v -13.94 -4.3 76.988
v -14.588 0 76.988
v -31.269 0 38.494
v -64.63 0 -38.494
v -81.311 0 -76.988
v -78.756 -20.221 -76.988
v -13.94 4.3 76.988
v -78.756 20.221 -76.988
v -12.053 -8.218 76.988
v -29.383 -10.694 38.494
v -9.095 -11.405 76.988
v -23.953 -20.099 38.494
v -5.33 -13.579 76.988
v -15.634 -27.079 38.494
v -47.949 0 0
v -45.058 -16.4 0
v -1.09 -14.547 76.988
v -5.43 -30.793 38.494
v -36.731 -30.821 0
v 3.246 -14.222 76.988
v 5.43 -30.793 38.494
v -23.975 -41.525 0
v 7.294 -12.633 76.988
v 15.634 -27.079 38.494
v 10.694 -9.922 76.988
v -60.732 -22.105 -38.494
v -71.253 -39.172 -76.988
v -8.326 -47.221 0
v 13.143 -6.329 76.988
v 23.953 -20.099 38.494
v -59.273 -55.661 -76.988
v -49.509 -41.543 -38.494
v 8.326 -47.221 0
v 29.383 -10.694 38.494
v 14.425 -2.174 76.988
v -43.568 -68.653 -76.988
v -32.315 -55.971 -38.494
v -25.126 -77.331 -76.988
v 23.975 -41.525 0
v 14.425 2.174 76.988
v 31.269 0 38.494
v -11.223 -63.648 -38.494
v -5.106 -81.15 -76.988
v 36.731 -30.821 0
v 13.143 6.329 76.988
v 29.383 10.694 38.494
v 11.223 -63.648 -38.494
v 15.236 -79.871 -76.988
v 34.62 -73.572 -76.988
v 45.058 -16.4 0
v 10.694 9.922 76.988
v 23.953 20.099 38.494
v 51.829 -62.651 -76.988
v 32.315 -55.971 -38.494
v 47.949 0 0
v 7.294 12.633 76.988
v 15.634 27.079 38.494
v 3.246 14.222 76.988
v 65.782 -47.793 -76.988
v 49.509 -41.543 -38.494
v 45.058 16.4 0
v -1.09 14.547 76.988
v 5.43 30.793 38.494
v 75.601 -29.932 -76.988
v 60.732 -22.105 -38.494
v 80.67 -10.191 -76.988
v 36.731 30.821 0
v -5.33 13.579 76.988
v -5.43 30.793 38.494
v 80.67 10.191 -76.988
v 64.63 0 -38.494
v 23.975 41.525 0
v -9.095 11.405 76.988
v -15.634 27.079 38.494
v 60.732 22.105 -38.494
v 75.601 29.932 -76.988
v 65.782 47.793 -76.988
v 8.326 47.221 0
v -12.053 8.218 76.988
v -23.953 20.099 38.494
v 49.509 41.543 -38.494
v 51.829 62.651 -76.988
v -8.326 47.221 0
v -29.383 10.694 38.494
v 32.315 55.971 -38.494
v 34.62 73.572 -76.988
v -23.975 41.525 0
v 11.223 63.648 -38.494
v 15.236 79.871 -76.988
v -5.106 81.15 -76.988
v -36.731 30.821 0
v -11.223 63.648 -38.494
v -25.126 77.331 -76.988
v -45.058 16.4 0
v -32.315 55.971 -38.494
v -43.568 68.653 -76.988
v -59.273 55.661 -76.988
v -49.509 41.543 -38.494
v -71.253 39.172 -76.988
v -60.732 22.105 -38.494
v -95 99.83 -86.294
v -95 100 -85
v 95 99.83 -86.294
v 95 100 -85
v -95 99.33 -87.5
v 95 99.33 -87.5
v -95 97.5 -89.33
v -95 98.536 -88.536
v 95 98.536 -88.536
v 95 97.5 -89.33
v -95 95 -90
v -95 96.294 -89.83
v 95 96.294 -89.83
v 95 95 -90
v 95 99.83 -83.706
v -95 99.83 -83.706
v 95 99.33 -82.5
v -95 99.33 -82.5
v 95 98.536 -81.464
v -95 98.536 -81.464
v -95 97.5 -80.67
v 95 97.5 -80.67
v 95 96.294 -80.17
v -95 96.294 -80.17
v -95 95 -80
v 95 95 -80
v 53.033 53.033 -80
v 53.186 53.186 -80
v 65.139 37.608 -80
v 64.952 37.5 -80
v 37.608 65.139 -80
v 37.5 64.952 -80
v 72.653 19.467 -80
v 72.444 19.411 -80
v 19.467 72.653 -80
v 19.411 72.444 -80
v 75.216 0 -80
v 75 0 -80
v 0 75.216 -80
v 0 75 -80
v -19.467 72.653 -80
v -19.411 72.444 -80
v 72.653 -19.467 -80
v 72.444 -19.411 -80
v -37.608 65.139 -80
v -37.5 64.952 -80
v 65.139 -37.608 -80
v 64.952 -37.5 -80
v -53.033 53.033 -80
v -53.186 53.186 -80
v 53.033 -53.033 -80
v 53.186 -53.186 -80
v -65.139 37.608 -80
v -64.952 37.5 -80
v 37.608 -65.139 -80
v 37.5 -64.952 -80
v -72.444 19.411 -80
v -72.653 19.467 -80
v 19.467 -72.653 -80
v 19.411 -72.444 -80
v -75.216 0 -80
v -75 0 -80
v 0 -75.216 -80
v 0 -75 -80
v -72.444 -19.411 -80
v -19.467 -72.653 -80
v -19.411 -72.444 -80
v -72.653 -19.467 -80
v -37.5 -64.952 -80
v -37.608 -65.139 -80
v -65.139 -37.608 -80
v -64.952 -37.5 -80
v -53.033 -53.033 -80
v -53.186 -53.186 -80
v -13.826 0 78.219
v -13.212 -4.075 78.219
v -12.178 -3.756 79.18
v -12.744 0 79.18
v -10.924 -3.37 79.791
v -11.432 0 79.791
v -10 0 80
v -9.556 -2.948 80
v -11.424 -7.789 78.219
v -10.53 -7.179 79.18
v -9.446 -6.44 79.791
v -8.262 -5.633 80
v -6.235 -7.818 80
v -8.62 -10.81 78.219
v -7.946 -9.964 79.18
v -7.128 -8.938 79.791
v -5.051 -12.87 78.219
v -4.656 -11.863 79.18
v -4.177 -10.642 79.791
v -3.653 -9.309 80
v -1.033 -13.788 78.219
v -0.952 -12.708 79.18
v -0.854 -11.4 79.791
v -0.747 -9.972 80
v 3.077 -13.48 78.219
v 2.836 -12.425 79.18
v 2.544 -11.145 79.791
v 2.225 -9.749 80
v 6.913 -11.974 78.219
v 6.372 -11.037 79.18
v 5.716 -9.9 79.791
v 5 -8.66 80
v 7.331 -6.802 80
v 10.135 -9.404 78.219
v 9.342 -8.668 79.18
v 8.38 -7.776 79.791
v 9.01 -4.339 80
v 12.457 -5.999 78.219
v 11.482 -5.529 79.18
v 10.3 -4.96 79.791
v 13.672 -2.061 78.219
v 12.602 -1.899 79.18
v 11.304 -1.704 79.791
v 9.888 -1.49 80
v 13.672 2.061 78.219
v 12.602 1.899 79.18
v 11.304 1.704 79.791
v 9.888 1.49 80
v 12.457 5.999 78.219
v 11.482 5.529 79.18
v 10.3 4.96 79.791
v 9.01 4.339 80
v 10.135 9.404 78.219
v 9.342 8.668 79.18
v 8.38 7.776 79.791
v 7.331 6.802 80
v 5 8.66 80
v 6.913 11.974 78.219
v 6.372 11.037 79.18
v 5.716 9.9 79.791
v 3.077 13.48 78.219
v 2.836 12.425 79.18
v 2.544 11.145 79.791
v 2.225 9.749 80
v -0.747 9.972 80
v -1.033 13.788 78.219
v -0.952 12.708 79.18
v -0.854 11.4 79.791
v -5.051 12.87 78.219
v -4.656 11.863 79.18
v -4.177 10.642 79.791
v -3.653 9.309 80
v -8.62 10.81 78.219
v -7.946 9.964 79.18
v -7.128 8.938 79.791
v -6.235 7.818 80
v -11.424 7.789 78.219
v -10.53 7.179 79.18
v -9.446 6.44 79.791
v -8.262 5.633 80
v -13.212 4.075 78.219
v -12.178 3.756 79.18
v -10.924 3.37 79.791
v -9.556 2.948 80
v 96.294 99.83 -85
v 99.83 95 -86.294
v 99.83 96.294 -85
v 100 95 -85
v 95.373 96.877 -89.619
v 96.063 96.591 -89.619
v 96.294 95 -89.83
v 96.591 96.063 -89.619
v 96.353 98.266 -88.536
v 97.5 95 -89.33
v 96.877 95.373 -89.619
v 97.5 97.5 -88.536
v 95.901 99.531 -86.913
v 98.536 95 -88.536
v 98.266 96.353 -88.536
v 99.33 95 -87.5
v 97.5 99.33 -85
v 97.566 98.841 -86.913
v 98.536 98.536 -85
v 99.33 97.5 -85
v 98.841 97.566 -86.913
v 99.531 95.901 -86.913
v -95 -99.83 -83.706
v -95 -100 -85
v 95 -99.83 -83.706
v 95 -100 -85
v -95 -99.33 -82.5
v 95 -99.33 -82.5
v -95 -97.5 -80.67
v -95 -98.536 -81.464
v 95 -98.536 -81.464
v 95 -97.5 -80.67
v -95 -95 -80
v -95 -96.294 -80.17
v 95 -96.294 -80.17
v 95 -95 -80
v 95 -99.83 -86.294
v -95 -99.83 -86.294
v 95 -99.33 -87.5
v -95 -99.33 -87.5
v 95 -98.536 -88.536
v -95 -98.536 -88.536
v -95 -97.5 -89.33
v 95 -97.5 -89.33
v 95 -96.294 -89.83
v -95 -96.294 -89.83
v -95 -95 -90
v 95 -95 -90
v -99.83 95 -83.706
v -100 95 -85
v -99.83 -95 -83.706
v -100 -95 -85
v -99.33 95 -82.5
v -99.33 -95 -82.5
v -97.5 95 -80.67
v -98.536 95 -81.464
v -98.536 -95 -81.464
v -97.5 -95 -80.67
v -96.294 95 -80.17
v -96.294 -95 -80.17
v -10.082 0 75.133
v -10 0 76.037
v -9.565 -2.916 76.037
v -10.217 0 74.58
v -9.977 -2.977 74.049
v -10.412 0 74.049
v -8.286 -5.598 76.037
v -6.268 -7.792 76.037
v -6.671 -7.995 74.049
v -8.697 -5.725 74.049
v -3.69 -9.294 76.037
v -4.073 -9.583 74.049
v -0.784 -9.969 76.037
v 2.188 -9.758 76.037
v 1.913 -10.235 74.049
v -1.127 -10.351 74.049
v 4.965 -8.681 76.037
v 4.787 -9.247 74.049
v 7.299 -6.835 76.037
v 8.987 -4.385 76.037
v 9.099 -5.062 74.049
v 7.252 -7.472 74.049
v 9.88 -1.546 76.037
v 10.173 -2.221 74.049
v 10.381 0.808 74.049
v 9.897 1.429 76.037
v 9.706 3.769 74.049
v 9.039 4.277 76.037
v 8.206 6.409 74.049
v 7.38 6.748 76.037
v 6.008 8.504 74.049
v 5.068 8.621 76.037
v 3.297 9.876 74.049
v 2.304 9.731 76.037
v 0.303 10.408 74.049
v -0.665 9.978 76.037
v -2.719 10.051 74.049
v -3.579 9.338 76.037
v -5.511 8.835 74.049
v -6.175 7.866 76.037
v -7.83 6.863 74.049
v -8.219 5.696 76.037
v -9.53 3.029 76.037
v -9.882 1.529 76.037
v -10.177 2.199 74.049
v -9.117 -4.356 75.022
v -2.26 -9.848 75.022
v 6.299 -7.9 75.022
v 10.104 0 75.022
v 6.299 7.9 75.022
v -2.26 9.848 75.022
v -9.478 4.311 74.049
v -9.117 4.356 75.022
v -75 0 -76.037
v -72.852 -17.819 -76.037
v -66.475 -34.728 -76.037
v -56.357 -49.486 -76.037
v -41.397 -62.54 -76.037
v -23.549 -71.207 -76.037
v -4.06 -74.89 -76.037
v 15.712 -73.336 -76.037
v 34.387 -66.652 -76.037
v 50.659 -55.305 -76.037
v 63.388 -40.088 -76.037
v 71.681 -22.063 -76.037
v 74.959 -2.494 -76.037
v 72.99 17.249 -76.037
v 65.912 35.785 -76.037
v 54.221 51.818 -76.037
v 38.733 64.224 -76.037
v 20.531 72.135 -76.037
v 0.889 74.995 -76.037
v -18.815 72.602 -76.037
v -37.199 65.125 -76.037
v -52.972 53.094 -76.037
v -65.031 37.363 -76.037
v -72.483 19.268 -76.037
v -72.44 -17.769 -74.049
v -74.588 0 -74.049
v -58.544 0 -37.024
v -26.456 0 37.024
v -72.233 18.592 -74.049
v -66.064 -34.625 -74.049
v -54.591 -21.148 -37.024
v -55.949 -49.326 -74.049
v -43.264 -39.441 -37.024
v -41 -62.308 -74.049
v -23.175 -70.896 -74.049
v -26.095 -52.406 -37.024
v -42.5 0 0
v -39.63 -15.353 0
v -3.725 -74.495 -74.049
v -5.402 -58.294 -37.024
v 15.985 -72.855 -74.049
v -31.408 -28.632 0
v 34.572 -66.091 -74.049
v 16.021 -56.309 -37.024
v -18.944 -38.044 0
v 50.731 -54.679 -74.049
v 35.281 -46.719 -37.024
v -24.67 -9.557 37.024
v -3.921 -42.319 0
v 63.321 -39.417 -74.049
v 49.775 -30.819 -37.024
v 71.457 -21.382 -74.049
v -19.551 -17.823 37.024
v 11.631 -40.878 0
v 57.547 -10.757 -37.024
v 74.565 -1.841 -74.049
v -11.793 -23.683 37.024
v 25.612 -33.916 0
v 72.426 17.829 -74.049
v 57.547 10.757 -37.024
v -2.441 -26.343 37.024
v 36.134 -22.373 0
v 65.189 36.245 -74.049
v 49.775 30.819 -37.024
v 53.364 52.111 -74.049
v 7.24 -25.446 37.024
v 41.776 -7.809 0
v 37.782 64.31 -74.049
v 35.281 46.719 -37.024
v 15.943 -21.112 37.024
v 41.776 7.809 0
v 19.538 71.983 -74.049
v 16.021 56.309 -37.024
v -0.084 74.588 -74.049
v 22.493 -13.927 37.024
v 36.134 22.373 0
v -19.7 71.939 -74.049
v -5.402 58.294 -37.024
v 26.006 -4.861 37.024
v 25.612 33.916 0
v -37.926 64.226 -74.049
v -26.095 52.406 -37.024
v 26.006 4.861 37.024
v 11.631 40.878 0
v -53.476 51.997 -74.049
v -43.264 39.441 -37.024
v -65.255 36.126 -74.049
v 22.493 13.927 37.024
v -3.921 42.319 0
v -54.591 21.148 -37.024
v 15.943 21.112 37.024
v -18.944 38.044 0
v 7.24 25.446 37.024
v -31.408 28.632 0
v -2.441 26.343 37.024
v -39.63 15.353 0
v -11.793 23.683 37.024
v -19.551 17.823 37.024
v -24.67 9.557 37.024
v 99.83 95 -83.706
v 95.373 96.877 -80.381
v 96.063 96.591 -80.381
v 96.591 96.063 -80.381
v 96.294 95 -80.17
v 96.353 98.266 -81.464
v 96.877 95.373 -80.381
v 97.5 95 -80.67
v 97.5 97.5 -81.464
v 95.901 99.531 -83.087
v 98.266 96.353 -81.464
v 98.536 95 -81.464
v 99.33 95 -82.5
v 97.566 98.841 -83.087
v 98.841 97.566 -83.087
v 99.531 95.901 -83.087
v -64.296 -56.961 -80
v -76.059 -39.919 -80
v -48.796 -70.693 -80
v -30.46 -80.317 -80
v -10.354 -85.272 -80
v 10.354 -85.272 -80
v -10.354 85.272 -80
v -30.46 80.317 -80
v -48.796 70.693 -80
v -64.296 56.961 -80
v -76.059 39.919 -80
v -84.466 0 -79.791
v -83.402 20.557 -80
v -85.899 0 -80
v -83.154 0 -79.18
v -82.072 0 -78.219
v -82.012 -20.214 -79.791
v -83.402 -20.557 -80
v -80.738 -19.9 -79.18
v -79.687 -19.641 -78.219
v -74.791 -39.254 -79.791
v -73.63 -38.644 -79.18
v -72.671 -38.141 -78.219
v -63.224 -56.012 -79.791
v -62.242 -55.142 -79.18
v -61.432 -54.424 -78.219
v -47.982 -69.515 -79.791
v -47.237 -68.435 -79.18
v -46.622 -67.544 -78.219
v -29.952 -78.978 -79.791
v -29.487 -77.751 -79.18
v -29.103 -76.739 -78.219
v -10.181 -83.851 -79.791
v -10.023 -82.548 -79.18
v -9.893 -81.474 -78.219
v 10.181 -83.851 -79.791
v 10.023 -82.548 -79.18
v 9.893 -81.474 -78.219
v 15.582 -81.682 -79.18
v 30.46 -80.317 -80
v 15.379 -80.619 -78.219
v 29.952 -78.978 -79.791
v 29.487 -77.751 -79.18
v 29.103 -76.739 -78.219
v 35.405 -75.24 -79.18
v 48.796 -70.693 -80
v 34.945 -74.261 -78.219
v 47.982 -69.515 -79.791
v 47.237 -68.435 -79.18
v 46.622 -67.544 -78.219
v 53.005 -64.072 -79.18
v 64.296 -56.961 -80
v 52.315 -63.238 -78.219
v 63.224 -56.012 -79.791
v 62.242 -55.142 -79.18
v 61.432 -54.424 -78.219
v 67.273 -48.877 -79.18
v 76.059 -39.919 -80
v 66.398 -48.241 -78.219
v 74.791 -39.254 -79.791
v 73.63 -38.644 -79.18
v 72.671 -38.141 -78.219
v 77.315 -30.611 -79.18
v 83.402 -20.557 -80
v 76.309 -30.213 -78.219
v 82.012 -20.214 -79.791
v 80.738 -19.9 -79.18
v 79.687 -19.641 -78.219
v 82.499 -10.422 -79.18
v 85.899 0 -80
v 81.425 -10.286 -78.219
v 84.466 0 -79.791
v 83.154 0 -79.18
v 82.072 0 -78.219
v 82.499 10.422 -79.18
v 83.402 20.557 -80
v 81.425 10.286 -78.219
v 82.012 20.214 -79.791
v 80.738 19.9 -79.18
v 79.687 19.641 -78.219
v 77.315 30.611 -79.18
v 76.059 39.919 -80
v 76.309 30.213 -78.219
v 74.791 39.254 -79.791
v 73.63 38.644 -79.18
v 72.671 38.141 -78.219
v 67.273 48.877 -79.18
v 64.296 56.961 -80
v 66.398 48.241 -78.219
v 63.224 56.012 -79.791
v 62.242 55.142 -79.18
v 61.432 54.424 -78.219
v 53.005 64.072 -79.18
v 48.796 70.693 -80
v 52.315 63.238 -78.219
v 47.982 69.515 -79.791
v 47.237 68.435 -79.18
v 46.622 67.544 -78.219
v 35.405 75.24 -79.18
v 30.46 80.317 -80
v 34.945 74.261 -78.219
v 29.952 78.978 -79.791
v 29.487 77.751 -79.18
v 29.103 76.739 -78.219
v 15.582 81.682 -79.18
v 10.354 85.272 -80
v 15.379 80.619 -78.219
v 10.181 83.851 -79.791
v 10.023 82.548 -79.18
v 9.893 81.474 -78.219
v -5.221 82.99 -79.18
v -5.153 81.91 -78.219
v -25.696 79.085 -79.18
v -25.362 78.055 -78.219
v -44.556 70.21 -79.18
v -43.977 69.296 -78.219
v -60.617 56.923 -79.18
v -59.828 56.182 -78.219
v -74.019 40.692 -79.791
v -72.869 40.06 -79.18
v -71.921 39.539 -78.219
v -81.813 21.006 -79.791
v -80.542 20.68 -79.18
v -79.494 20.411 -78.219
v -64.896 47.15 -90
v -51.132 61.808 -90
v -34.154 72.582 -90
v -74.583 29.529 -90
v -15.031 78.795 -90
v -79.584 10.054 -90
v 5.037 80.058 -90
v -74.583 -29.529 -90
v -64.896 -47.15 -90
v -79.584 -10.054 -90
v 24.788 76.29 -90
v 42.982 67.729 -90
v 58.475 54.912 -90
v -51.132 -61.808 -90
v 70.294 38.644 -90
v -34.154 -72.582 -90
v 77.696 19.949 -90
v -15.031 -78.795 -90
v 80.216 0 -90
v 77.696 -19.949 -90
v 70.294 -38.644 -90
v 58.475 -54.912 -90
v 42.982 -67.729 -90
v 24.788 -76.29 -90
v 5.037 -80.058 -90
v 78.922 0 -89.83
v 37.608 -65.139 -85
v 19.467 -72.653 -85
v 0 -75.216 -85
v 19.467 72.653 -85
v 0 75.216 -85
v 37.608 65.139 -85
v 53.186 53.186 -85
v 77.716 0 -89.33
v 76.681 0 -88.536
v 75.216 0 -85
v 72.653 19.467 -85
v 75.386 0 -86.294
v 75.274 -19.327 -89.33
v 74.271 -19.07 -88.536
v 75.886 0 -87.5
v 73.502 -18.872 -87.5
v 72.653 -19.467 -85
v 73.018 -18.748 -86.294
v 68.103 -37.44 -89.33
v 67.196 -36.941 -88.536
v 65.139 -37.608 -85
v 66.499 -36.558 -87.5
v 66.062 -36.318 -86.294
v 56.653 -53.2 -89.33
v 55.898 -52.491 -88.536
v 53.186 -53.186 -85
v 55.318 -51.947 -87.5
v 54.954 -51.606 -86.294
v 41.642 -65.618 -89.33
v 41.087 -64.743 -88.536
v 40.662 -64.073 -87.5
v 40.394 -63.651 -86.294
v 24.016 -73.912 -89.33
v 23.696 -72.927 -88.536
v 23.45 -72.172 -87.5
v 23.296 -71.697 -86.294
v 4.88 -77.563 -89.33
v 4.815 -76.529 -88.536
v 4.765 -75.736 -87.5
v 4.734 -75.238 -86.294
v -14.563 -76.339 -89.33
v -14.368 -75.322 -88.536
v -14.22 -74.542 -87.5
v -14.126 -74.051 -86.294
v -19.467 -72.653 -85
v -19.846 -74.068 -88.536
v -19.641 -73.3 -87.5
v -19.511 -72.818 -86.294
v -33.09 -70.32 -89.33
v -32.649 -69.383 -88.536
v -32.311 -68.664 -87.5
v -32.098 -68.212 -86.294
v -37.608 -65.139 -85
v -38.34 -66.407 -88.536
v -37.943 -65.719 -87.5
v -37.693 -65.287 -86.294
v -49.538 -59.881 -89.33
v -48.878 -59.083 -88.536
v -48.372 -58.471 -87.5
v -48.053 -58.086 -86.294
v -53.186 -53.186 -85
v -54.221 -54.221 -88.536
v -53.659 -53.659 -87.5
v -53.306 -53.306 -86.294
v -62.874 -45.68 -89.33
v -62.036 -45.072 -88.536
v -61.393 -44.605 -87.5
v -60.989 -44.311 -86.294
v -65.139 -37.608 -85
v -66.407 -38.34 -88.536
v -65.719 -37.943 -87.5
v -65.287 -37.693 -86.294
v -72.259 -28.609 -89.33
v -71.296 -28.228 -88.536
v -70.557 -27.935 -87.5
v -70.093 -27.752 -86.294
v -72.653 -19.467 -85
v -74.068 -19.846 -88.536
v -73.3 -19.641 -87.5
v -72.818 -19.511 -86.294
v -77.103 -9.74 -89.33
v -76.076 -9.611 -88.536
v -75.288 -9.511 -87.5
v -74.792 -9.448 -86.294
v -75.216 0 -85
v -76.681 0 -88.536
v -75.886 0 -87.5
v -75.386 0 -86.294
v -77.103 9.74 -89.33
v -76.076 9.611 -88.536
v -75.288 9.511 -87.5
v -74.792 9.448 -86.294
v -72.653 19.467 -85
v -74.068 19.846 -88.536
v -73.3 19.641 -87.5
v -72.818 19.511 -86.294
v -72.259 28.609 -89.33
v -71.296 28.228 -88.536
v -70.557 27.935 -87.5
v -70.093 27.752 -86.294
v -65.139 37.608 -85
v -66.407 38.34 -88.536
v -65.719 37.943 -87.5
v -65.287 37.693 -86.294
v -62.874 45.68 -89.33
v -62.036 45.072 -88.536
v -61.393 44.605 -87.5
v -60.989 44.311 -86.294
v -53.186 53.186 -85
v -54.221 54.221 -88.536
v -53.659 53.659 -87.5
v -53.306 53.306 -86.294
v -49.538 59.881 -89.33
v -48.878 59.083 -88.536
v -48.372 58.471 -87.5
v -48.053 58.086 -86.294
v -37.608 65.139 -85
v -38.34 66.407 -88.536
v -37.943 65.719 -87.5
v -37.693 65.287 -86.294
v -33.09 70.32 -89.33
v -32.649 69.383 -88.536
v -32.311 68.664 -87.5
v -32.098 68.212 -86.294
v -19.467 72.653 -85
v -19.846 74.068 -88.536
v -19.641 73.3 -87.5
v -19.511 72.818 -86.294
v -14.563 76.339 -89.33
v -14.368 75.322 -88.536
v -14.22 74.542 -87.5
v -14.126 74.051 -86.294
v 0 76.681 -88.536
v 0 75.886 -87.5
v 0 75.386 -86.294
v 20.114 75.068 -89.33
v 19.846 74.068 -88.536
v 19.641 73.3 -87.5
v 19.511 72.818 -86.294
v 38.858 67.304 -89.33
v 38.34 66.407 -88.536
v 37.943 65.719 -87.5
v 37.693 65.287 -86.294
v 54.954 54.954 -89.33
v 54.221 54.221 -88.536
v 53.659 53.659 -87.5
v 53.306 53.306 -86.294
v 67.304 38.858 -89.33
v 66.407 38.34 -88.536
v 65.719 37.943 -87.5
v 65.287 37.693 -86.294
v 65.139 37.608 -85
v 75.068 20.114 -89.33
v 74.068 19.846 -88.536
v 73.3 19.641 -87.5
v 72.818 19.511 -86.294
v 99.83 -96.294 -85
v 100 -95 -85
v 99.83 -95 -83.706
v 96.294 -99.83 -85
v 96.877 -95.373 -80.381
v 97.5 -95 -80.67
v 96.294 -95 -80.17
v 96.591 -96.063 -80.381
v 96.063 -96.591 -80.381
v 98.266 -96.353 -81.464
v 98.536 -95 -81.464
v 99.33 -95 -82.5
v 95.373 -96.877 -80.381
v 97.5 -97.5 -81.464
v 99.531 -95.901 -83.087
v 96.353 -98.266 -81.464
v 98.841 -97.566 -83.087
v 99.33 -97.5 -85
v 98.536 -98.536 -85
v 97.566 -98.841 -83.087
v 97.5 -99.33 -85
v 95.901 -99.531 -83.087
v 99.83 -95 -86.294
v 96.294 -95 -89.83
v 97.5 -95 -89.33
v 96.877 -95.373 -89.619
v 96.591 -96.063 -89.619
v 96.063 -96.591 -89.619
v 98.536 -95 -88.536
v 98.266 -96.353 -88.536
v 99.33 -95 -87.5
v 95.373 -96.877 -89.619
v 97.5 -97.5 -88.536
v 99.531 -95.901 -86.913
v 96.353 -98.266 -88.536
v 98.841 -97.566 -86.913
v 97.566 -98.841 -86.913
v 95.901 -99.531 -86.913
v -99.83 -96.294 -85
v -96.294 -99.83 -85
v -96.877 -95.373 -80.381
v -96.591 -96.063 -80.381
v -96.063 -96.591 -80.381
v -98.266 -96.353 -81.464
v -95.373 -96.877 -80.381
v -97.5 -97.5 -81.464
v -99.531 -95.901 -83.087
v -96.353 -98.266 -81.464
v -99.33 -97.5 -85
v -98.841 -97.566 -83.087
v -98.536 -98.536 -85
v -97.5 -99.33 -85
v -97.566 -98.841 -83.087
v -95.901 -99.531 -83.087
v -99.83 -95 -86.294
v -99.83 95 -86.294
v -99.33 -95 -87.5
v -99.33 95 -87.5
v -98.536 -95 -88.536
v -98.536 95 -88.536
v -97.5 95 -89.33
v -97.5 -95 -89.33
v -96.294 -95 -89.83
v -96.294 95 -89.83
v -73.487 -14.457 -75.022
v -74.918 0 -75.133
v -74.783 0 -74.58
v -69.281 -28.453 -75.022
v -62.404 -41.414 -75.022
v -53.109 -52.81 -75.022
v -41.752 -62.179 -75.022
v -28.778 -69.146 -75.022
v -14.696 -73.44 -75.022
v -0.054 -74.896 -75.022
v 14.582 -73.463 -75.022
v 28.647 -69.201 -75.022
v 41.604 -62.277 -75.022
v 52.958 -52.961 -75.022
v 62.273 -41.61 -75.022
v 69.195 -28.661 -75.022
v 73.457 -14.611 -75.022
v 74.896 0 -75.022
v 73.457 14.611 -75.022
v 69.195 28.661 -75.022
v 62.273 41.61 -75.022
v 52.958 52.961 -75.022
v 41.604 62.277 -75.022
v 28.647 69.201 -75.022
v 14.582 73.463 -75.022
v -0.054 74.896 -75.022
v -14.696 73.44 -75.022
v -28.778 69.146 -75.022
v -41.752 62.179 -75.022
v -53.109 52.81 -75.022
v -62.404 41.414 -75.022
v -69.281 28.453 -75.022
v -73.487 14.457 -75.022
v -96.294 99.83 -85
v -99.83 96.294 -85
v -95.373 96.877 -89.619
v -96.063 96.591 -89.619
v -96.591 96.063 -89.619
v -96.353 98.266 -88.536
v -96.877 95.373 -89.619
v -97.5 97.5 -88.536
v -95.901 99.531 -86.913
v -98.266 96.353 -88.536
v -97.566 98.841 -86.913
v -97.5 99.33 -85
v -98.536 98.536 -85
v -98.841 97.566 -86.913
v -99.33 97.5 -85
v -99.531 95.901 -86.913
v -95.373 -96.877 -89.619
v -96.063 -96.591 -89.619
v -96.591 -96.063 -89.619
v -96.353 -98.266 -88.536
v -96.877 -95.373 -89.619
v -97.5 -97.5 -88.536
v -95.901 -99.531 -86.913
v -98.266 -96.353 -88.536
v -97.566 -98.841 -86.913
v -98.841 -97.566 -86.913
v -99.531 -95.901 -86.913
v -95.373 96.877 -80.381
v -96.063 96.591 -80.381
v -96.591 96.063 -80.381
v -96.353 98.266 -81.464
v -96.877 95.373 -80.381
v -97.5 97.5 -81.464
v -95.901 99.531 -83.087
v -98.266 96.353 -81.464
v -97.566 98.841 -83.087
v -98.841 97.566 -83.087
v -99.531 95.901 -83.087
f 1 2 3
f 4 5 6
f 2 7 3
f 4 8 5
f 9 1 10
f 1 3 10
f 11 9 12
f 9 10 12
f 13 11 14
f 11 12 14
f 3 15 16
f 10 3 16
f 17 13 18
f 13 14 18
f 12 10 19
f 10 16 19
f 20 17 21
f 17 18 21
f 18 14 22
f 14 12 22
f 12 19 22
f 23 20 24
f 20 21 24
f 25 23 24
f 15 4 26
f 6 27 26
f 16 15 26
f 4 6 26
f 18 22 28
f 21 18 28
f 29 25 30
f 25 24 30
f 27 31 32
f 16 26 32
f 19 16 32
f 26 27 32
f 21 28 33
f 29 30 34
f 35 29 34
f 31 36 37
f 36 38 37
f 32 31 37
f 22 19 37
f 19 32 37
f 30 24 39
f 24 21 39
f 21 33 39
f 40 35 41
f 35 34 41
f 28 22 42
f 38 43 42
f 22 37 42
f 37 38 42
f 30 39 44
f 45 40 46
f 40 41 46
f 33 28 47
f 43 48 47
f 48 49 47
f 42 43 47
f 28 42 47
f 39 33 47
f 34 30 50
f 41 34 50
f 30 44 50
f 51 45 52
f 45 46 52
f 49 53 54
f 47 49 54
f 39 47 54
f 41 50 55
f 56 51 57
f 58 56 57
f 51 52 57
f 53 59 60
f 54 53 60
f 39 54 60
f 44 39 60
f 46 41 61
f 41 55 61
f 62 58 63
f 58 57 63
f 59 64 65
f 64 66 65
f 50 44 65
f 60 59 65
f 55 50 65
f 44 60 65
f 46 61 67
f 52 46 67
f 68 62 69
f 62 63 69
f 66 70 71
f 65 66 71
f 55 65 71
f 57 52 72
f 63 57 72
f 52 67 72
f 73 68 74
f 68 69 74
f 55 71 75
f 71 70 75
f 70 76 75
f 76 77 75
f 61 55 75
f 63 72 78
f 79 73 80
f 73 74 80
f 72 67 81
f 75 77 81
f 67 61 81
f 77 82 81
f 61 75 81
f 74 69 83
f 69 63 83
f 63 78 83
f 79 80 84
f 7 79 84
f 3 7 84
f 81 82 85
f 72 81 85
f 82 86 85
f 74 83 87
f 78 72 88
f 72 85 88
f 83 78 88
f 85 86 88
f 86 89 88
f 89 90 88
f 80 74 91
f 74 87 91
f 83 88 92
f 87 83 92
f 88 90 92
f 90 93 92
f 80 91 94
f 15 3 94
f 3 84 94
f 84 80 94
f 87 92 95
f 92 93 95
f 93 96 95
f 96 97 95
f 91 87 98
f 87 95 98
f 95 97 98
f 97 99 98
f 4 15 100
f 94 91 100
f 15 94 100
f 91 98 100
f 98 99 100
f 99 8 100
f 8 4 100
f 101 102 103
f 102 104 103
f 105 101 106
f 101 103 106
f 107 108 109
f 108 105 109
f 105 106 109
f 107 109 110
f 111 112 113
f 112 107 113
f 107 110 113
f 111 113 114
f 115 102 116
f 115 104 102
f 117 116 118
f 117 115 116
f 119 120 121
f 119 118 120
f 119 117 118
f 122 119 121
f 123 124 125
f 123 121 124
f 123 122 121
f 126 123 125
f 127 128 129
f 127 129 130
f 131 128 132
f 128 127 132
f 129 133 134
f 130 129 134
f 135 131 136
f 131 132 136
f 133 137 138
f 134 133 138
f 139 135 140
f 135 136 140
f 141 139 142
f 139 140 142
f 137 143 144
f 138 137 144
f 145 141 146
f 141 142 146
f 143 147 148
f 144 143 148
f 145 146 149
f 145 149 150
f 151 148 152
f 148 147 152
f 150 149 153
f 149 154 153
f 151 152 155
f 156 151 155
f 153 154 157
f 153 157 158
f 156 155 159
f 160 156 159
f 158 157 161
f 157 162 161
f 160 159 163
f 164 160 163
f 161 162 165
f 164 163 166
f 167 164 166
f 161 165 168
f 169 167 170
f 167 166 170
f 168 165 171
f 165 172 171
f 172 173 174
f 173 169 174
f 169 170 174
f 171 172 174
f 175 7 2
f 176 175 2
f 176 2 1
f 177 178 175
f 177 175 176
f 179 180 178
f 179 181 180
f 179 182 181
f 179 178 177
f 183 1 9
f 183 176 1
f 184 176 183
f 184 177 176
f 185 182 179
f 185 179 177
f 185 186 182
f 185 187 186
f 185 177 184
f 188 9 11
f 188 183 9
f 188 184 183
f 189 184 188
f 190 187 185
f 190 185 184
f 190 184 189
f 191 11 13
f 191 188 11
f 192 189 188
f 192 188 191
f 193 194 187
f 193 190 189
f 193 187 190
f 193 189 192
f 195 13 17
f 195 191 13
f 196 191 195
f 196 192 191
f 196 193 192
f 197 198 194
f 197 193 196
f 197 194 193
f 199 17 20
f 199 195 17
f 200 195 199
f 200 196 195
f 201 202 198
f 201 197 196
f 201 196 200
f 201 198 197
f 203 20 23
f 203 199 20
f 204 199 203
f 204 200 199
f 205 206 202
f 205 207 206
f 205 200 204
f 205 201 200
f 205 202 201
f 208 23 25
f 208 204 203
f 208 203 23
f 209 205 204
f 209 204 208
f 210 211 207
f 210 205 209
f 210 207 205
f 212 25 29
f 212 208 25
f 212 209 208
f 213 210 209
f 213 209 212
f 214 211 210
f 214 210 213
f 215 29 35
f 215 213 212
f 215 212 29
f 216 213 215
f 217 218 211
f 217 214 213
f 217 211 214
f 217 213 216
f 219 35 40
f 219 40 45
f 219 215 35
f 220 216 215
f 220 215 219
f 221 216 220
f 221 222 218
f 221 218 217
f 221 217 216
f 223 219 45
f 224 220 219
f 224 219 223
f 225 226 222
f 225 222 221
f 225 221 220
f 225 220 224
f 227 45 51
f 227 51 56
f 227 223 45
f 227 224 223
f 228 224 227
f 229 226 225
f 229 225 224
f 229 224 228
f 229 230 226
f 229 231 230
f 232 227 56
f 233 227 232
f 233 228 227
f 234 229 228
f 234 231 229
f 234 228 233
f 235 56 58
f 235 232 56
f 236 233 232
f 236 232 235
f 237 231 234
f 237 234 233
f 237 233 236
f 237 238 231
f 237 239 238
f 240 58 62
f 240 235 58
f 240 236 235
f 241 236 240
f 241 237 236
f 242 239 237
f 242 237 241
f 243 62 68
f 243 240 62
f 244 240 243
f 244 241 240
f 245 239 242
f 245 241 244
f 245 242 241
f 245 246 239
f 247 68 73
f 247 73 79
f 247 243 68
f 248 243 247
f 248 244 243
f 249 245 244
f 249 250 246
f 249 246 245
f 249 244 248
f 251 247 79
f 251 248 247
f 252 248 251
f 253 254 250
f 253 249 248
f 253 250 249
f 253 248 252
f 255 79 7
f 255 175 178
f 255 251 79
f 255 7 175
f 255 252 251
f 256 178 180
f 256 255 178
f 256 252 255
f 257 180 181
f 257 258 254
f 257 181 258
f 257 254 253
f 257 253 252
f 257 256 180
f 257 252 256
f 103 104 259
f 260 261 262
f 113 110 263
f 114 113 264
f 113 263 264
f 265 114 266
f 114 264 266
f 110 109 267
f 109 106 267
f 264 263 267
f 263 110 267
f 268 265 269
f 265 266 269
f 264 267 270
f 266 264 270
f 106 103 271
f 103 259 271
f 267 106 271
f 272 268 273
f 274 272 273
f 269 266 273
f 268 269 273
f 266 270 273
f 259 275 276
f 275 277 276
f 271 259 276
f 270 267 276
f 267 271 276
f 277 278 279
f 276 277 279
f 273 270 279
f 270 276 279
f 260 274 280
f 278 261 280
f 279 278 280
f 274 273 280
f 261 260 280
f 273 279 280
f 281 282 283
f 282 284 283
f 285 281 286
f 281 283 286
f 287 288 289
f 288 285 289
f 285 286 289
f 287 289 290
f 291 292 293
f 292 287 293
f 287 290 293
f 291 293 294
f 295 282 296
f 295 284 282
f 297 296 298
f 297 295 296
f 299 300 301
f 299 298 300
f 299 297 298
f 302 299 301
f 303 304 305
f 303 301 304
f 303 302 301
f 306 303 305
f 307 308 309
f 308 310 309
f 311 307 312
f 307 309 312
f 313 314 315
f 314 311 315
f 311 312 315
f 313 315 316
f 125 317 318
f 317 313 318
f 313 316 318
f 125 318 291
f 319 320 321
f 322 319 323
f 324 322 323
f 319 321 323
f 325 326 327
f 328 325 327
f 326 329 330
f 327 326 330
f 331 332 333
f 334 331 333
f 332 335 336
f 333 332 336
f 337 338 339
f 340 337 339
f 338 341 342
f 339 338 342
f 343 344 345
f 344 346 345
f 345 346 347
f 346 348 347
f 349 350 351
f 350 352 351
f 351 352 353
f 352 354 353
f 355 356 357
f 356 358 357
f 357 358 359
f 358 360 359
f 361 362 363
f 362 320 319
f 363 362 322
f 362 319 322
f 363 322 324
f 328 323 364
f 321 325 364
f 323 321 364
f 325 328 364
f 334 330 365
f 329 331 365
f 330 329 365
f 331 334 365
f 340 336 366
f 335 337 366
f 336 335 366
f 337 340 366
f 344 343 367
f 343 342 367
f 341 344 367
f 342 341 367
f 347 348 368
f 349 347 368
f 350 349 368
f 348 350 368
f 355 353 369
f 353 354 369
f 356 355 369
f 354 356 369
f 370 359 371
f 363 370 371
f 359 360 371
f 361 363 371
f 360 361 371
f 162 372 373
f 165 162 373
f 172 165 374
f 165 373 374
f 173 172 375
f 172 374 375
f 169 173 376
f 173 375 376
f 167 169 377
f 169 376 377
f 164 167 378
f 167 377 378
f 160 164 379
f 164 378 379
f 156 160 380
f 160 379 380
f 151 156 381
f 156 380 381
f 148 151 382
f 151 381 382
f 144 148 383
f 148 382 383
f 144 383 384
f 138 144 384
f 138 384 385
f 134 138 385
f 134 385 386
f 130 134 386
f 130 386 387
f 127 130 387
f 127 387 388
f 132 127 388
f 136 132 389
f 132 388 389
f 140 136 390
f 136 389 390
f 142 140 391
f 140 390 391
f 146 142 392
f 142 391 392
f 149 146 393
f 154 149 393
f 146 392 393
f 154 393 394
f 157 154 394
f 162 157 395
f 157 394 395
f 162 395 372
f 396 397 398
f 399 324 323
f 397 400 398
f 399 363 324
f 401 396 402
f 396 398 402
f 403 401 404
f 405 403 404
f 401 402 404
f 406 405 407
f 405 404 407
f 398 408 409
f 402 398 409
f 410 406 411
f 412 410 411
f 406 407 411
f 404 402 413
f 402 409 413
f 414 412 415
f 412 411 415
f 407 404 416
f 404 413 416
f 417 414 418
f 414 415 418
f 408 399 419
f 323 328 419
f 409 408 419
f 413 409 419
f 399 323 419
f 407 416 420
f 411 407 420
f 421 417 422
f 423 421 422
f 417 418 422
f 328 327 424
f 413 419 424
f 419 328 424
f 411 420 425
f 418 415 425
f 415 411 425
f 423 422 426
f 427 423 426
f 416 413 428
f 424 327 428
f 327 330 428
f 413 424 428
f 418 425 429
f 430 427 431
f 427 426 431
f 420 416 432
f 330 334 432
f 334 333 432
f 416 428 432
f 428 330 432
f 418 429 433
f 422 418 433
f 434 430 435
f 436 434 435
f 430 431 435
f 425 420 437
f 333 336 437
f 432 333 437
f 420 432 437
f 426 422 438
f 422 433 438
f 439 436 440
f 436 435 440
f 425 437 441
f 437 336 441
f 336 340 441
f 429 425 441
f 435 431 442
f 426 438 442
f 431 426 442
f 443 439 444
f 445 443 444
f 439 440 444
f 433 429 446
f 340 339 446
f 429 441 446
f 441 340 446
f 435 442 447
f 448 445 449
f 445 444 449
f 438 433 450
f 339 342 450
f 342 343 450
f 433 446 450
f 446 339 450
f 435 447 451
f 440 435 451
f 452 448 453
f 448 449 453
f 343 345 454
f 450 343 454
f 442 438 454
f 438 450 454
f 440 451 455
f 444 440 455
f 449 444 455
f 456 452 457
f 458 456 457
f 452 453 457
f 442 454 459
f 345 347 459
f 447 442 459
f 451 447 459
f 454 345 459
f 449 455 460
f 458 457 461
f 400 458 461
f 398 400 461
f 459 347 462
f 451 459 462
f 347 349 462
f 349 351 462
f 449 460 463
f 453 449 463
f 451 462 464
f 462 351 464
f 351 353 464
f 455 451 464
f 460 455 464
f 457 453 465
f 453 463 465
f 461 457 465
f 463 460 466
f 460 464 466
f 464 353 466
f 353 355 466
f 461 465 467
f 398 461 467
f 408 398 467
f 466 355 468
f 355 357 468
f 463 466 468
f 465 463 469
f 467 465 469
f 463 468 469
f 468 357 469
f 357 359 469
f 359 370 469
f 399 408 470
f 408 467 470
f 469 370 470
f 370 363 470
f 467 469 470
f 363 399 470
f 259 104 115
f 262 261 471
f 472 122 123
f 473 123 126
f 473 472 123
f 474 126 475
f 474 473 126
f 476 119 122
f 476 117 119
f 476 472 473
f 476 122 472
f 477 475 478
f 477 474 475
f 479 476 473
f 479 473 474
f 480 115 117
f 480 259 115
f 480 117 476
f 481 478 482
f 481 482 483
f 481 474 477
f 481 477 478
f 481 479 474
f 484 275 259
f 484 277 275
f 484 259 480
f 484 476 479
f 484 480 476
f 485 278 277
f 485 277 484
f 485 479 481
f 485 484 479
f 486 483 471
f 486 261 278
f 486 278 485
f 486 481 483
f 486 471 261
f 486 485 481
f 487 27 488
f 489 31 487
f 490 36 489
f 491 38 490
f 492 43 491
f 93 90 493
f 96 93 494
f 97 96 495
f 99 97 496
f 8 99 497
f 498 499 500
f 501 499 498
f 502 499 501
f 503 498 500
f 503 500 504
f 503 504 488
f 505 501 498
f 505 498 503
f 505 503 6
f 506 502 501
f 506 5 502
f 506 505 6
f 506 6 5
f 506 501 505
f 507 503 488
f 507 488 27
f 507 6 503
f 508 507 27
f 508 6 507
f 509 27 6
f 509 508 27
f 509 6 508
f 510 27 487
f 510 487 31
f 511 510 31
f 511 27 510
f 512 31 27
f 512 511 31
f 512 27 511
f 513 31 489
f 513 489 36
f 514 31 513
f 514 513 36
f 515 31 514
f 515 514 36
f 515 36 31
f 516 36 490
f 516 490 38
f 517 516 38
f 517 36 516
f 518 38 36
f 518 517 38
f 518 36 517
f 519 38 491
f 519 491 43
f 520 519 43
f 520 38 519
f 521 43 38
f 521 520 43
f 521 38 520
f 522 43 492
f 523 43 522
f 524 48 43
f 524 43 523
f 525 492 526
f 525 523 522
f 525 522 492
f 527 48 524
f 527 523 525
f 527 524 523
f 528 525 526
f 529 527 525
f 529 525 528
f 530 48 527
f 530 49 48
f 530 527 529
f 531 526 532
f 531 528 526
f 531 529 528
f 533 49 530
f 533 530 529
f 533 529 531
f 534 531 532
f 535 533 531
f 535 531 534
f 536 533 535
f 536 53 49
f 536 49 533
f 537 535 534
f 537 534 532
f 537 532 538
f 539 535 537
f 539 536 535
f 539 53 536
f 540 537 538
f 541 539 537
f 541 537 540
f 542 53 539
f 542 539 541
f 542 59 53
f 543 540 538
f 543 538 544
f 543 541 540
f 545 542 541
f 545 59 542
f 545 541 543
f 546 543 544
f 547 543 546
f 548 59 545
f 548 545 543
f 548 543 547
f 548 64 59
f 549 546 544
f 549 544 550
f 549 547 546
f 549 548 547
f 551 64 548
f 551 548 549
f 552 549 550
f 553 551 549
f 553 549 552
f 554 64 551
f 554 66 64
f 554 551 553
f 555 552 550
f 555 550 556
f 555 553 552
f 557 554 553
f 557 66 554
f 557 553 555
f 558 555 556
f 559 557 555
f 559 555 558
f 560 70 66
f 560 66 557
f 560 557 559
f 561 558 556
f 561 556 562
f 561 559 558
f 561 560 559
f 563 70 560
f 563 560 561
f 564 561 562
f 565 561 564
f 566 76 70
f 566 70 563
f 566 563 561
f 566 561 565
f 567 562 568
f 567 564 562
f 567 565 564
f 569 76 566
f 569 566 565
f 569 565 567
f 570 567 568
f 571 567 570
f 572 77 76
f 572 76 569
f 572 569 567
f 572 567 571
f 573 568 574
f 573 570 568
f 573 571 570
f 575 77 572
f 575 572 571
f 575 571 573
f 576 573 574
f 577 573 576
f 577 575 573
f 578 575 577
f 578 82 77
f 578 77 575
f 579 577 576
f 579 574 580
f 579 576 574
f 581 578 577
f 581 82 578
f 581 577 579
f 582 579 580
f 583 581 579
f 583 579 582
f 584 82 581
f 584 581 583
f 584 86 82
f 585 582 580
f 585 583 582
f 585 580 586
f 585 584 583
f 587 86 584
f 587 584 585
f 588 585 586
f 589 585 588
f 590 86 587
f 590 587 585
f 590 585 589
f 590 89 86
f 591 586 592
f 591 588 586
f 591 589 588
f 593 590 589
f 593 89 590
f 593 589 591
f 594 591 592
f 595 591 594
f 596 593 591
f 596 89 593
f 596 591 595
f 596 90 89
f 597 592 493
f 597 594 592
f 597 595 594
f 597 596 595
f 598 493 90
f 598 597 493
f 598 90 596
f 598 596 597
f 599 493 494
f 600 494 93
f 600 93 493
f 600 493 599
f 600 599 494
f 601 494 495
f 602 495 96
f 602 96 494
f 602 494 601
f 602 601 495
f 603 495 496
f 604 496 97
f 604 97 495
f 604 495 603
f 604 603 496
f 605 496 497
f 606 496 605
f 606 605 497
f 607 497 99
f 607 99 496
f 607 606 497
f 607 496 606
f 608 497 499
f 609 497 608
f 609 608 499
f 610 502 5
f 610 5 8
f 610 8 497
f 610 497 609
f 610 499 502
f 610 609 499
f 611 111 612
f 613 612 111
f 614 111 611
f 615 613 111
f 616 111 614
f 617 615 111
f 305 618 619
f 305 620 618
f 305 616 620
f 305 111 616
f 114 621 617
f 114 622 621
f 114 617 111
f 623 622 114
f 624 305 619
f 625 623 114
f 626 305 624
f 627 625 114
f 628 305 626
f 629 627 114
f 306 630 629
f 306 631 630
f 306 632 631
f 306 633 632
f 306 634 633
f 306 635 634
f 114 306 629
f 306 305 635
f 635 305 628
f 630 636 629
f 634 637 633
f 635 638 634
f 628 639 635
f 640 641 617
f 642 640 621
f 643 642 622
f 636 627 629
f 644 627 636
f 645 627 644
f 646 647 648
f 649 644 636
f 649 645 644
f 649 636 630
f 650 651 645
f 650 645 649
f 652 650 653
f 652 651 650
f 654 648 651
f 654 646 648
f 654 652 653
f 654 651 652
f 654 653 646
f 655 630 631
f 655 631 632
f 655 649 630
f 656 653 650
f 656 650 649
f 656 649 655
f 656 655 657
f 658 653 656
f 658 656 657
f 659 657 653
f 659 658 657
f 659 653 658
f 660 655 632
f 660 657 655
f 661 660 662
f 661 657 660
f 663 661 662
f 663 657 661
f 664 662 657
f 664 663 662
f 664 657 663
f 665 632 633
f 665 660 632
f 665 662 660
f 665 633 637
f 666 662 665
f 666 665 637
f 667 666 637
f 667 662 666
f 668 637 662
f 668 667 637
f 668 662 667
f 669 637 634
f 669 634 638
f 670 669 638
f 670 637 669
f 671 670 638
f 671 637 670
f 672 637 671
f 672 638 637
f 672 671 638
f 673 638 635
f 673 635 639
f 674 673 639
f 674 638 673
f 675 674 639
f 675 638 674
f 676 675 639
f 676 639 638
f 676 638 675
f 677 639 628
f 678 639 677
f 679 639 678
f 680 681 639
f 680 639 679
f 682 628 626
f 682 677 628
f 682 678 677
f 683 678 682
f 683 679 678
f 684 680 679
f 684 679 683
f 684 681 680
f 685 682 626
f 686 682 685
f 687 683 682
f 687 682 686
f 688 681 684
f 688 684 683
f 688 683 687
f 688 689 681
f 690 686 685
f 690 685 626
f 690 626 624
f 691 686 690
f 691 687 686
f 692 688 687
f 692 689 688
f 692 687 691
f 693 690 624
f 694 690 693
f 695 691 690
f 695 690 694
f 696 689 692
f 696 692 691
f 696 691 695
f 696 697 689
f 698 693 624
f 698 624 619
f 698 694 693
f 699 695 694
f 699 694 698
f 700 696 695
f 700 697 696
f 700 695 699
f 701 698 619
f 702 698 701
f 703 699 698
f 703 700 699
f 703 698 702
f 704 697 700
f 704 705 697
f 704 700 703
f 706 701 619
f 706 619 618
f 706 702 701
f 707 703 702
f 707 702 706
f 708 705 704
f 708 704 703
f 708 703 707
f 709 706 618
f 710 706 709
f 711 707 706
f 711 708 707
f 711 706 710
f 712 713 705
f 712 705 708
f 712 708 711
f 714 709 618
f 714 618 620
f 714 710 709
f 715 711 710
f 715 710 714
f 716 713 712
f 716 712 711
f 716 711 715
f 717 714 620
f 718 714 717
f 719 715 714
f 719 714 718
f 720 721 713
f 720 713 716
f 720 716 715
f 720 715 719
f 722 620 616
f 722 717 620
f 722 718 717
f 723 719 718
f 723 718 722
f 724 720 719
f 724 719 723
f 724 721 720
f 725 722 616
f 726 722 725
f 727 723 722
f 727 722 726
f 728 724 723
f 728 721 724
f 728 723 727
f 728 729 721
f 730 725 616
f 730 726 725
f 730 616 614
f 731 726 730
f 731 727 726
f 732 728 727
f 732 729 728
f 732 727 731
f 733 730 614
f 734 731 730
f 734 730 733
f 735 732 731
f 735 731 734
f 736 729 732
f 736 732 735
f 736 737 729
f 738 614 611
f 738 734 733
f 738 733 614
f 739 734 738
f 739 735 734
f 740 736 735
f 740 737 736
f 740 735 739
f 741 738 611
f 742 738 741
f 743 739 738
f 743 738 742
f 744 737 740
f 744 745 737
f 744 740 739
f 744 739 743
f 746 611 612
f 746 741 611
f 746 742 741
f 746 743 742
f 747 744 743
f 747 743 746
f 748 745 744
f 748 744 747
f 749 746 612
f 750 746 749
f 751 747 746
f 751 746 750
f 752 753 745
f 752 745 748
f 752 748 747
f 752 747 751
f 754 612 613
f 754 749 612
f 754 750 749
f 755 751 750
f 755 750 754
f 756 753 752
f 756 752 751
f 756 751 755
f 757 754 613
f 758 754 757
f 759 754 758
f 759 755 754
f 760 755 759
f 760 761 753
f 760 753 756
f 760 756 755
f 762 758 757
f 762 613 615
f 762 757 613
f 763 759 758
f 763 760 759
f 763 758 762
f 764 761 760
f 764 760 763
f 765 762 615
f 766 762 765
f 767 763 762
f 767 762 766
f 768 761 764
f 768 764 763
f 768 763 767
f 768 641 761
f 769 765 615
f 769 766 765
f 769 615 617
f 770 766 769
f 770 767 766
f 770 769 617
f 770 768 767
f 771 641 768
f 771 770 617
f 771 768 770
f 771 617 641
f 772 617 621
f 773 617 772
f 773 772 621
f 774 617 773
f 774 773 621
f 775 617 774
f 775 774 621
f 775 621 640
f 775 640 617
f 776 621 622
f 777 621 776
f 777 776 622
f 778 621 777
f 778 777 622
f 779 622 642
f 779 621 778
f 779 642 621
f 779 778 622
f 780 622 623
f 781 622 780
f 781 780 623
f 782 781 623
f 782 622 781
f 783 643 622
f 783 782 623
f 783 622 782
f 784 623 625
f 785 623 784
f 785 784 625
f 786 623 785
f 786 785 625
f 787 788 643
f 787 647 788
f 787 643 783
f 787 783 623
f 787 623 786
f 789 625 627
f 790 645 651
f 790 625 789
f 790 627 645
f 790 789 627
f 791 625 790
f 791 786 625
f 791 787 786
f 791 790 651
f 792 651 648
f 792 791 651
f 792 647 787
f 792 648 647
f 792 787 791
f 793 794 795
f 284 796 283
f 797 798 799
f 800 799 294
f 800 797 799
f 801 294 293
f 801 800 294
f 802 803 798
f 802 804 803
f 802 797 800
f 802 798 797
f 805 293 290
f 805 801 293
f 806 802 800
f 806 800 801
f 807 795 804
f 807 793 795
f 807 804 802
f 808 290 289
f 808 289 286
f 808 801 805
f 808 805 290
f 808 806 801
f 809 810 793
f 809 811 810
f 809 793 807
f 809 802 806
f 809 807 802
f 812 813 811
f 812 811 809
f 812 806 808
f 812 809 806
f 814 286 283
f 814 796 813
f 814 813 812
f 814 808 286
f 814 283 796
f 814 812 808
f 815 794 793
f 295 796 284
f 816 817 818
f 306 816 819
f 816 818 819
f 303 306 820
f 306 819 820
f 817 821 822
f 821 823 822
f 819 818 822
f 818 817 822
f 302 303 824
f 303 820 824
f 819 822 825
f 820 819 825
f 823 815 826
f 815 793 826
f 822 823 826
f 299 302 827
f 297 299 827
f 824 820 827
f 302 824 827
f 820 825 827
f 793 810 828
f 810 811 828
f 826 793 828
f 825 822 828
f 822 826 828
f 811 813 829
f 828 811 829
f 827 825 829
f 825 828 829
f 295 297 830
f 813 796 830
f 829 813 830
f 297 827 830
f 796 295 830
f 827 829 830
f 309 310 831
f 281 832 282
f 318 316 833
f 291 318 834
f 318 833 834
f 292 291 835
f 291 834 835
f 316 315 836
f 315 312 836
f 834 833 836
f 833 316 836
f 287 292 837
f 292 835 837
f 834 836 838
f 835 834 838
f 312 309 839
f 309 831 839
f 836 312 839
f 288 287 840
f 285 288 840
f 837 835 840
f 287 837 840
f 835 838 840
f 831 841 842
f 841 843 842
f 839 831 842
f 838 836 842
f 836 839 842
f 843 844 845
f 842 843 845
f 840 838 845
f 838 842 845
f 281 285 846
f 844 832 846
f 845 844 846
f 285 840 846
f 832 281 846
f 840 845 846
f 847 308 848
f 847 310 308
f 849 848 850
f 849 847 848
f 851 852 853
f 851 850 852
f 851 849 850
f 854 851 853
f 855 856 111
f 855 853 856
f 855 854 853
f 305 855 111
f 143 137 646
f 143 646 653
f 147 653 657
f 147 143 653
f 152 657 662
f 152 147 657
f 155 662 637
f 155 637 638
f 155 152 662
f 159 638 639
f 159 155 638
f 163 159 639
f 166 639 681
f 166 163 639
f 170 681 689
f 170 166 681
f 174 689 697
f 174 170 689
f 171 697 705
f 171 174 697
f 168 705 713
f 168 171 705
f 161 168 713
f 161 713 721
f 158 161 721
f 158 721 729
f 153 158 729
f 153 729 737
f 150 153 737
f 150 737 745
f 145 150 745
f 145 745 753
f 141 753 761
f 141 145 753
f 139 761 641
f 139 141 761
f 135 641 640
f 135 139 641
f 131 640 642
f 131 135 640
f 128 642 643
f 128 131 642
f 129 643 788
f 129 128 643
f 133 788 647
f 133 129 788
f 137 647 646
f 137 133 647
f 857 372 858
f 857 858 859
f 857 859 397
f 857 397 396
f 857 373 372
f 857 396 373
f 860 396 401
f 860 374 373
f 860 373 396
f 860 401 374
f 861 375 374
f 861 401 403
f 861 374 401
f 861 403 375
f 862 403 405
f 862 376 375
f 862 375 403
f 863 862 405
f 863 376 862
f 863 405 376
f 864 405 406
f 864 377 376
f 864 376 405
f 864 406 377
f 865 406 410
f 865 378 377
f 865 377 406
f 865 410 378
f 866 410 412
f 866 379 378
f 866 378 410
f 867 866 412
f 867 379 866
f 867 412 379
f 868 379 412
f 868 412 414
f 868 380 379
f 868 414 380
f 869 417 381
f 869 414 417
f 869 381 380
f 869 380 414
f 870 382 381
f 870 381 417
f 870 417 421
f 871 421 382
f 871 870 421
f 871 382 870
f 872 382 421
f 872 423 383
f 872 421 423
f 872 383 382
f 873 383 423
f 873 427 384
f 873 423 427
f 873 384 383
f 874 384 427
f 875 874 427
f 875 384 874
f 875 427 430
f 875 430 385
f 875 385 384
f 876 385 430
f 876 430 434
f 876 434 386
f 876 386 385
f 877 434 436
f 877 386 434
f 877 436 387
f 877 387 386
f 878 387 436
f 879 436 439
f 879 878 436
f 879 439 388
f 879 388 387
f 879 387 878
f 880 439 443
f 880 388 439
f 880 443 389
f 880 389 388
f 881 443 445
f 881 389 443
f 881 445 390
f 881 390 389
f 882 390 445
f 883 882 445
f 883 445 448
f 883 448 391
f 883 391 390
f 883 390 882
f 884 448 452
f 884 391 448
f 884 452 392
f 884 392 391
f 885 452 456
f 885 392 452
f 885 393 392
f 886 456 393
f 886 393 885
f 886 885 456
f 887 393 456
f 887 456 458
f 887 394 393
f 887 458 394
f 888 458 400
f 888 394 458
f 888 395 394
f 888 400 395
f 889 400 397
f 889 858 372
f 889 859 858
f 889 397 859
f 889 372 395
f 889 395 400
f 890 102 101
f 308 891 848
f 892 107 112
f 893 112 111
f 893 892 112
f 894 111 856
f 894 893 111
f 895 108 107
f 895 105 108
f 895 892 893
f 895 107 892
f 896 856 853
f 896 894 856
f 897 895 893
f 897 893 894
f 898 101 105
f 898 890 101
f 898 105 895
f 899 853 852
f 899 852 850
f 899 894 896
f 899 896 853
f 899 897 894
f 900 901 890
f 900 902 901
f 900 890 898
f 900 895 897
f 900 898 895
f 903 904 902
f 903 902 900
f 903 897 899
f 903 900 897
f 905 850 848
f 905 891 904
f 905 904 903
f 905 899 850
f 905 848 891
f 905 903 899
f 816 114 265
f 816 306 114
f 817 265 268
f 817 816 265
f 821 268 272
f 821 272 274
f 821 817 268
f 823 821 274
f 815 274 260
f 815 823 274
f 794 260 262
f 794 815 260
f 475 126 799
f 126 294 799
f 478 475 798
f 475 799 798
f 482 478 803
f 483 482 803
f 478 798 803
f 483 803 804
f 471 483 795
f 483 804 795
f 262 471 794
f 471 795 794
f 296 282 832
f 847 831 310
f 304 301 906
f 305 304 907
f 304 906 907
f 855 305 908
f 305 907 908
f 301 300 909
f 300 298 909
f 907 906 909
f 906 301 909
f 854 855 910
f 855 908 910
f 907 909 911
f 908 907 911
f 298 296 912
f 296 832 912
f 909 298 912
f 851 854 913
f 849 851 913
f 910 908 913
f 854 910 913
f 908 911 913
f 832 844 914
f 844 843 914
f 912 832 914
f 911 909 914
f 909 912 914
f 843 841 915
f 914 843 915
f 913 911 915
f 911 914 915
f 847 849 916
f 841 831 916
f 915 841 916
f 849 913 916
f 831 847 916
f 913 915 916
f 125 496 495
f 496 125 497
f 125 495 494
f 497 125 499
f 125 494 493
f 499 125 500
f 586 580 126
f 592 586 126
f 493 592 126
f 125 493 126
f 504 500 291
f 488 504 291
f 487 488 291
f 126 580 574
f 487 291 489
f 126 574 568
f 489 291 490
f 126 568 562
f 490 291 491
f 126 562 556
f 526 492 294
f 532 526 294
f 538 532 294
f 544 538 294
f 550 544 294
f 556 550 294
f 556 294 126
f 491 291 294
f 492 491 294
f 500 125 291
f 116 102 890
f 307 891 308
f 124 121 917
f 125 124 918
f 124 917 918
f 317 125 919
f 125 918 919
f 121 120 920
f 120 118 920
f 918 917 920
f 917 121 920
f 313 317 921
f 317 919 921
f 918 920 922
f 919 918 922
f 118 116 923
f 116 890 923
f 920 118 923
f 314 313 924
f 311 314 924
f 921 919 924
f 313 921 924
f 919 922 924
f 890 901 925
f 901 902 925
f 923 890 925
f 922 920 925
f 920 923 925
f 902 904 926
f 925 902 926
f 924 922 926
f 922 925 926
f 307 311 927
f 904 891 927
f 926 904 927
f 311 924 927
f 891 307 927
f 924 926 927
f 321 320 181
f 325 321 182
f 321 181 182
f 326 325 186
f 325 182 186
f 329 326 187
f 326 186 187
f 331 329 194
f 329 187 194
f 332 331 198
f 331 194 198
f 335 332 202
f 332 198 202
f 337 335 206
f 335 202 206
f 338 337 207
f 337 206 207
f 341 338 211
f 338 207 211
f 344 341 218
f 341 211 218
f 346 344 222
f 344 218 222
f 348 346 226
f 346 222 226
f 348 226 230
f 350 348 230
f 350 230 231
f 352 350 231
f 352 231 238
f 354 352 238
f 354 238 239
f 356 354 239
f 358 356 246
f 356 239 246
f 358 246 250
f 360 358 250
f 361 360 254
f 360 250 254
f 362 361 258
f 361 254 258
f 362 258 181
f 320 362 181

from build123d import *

# Parameters (mm, degrees)
F2_W     = 200
F2_H     = 200
F2_R     = 82.6159275748
F2_R_2   = 75.2160474693
F3_DEPTH = 10
F4_R     = 4.99999


# Not quite as in the source:
# - a fillet or chamfer is up to 0.001 mm smaller than in the source, because OpenCascade refuses the exact size


with BuildPart() as f1:
    # F0 (on Front) → F1 (revolve)
    with BuildSketch(Plane.XZ):
        Polygon((-75, -75), (-10, 75), (-10, 80), (-13.2825942414, 80), (-82.6159275748, -80), (-75, -80), align=None)
    revolve(axis=Axis((0, 0, 2.9210224748), (0, 0, 1)))

    # F2 (on face) → F3 (join)
    with BuildSketch(Plane(origin=(0, 0, -80), x_dir=(1, 0, 0), z_dir=(0, 0, -1))):
        Rectangle(F2_W, F2_H)
        Circle(F2_R, mode=Mode.SUBTRACT)
        Circle(F2_R)
        Circle(F2_R_2, mode=Mode.SUBTRACT)
    extrude(amount=F3_DEPTH)

    # F4 (radius 5 in the source; OpenCascade refuses exactly that, so slightly less here)
    f4_edges = [f1.edges().sort_by_distance(p)[0] for p in [
        (-100, 100, -85),
        (100, 100, -85),
        (100, -100, -85),
        (-75.216047, 0, -90),
        (75, 0, -75),
        (-100, -100, -85),
        (0, 100, -90),
        (100, 0, -90),
        (0, -100, -90),
        (-100, 0, -90),
        (0, 100, -80),
        (-100, 0, -80),
        (100, 0, -80),
        (0, -100, -80),
        (82.615928, 0, -80),
        (13.282594, 0, 80),
        (10, 0, 75),
    ]]
    fillet(f4_edges, radius=F4_R)


solid = f1.part
